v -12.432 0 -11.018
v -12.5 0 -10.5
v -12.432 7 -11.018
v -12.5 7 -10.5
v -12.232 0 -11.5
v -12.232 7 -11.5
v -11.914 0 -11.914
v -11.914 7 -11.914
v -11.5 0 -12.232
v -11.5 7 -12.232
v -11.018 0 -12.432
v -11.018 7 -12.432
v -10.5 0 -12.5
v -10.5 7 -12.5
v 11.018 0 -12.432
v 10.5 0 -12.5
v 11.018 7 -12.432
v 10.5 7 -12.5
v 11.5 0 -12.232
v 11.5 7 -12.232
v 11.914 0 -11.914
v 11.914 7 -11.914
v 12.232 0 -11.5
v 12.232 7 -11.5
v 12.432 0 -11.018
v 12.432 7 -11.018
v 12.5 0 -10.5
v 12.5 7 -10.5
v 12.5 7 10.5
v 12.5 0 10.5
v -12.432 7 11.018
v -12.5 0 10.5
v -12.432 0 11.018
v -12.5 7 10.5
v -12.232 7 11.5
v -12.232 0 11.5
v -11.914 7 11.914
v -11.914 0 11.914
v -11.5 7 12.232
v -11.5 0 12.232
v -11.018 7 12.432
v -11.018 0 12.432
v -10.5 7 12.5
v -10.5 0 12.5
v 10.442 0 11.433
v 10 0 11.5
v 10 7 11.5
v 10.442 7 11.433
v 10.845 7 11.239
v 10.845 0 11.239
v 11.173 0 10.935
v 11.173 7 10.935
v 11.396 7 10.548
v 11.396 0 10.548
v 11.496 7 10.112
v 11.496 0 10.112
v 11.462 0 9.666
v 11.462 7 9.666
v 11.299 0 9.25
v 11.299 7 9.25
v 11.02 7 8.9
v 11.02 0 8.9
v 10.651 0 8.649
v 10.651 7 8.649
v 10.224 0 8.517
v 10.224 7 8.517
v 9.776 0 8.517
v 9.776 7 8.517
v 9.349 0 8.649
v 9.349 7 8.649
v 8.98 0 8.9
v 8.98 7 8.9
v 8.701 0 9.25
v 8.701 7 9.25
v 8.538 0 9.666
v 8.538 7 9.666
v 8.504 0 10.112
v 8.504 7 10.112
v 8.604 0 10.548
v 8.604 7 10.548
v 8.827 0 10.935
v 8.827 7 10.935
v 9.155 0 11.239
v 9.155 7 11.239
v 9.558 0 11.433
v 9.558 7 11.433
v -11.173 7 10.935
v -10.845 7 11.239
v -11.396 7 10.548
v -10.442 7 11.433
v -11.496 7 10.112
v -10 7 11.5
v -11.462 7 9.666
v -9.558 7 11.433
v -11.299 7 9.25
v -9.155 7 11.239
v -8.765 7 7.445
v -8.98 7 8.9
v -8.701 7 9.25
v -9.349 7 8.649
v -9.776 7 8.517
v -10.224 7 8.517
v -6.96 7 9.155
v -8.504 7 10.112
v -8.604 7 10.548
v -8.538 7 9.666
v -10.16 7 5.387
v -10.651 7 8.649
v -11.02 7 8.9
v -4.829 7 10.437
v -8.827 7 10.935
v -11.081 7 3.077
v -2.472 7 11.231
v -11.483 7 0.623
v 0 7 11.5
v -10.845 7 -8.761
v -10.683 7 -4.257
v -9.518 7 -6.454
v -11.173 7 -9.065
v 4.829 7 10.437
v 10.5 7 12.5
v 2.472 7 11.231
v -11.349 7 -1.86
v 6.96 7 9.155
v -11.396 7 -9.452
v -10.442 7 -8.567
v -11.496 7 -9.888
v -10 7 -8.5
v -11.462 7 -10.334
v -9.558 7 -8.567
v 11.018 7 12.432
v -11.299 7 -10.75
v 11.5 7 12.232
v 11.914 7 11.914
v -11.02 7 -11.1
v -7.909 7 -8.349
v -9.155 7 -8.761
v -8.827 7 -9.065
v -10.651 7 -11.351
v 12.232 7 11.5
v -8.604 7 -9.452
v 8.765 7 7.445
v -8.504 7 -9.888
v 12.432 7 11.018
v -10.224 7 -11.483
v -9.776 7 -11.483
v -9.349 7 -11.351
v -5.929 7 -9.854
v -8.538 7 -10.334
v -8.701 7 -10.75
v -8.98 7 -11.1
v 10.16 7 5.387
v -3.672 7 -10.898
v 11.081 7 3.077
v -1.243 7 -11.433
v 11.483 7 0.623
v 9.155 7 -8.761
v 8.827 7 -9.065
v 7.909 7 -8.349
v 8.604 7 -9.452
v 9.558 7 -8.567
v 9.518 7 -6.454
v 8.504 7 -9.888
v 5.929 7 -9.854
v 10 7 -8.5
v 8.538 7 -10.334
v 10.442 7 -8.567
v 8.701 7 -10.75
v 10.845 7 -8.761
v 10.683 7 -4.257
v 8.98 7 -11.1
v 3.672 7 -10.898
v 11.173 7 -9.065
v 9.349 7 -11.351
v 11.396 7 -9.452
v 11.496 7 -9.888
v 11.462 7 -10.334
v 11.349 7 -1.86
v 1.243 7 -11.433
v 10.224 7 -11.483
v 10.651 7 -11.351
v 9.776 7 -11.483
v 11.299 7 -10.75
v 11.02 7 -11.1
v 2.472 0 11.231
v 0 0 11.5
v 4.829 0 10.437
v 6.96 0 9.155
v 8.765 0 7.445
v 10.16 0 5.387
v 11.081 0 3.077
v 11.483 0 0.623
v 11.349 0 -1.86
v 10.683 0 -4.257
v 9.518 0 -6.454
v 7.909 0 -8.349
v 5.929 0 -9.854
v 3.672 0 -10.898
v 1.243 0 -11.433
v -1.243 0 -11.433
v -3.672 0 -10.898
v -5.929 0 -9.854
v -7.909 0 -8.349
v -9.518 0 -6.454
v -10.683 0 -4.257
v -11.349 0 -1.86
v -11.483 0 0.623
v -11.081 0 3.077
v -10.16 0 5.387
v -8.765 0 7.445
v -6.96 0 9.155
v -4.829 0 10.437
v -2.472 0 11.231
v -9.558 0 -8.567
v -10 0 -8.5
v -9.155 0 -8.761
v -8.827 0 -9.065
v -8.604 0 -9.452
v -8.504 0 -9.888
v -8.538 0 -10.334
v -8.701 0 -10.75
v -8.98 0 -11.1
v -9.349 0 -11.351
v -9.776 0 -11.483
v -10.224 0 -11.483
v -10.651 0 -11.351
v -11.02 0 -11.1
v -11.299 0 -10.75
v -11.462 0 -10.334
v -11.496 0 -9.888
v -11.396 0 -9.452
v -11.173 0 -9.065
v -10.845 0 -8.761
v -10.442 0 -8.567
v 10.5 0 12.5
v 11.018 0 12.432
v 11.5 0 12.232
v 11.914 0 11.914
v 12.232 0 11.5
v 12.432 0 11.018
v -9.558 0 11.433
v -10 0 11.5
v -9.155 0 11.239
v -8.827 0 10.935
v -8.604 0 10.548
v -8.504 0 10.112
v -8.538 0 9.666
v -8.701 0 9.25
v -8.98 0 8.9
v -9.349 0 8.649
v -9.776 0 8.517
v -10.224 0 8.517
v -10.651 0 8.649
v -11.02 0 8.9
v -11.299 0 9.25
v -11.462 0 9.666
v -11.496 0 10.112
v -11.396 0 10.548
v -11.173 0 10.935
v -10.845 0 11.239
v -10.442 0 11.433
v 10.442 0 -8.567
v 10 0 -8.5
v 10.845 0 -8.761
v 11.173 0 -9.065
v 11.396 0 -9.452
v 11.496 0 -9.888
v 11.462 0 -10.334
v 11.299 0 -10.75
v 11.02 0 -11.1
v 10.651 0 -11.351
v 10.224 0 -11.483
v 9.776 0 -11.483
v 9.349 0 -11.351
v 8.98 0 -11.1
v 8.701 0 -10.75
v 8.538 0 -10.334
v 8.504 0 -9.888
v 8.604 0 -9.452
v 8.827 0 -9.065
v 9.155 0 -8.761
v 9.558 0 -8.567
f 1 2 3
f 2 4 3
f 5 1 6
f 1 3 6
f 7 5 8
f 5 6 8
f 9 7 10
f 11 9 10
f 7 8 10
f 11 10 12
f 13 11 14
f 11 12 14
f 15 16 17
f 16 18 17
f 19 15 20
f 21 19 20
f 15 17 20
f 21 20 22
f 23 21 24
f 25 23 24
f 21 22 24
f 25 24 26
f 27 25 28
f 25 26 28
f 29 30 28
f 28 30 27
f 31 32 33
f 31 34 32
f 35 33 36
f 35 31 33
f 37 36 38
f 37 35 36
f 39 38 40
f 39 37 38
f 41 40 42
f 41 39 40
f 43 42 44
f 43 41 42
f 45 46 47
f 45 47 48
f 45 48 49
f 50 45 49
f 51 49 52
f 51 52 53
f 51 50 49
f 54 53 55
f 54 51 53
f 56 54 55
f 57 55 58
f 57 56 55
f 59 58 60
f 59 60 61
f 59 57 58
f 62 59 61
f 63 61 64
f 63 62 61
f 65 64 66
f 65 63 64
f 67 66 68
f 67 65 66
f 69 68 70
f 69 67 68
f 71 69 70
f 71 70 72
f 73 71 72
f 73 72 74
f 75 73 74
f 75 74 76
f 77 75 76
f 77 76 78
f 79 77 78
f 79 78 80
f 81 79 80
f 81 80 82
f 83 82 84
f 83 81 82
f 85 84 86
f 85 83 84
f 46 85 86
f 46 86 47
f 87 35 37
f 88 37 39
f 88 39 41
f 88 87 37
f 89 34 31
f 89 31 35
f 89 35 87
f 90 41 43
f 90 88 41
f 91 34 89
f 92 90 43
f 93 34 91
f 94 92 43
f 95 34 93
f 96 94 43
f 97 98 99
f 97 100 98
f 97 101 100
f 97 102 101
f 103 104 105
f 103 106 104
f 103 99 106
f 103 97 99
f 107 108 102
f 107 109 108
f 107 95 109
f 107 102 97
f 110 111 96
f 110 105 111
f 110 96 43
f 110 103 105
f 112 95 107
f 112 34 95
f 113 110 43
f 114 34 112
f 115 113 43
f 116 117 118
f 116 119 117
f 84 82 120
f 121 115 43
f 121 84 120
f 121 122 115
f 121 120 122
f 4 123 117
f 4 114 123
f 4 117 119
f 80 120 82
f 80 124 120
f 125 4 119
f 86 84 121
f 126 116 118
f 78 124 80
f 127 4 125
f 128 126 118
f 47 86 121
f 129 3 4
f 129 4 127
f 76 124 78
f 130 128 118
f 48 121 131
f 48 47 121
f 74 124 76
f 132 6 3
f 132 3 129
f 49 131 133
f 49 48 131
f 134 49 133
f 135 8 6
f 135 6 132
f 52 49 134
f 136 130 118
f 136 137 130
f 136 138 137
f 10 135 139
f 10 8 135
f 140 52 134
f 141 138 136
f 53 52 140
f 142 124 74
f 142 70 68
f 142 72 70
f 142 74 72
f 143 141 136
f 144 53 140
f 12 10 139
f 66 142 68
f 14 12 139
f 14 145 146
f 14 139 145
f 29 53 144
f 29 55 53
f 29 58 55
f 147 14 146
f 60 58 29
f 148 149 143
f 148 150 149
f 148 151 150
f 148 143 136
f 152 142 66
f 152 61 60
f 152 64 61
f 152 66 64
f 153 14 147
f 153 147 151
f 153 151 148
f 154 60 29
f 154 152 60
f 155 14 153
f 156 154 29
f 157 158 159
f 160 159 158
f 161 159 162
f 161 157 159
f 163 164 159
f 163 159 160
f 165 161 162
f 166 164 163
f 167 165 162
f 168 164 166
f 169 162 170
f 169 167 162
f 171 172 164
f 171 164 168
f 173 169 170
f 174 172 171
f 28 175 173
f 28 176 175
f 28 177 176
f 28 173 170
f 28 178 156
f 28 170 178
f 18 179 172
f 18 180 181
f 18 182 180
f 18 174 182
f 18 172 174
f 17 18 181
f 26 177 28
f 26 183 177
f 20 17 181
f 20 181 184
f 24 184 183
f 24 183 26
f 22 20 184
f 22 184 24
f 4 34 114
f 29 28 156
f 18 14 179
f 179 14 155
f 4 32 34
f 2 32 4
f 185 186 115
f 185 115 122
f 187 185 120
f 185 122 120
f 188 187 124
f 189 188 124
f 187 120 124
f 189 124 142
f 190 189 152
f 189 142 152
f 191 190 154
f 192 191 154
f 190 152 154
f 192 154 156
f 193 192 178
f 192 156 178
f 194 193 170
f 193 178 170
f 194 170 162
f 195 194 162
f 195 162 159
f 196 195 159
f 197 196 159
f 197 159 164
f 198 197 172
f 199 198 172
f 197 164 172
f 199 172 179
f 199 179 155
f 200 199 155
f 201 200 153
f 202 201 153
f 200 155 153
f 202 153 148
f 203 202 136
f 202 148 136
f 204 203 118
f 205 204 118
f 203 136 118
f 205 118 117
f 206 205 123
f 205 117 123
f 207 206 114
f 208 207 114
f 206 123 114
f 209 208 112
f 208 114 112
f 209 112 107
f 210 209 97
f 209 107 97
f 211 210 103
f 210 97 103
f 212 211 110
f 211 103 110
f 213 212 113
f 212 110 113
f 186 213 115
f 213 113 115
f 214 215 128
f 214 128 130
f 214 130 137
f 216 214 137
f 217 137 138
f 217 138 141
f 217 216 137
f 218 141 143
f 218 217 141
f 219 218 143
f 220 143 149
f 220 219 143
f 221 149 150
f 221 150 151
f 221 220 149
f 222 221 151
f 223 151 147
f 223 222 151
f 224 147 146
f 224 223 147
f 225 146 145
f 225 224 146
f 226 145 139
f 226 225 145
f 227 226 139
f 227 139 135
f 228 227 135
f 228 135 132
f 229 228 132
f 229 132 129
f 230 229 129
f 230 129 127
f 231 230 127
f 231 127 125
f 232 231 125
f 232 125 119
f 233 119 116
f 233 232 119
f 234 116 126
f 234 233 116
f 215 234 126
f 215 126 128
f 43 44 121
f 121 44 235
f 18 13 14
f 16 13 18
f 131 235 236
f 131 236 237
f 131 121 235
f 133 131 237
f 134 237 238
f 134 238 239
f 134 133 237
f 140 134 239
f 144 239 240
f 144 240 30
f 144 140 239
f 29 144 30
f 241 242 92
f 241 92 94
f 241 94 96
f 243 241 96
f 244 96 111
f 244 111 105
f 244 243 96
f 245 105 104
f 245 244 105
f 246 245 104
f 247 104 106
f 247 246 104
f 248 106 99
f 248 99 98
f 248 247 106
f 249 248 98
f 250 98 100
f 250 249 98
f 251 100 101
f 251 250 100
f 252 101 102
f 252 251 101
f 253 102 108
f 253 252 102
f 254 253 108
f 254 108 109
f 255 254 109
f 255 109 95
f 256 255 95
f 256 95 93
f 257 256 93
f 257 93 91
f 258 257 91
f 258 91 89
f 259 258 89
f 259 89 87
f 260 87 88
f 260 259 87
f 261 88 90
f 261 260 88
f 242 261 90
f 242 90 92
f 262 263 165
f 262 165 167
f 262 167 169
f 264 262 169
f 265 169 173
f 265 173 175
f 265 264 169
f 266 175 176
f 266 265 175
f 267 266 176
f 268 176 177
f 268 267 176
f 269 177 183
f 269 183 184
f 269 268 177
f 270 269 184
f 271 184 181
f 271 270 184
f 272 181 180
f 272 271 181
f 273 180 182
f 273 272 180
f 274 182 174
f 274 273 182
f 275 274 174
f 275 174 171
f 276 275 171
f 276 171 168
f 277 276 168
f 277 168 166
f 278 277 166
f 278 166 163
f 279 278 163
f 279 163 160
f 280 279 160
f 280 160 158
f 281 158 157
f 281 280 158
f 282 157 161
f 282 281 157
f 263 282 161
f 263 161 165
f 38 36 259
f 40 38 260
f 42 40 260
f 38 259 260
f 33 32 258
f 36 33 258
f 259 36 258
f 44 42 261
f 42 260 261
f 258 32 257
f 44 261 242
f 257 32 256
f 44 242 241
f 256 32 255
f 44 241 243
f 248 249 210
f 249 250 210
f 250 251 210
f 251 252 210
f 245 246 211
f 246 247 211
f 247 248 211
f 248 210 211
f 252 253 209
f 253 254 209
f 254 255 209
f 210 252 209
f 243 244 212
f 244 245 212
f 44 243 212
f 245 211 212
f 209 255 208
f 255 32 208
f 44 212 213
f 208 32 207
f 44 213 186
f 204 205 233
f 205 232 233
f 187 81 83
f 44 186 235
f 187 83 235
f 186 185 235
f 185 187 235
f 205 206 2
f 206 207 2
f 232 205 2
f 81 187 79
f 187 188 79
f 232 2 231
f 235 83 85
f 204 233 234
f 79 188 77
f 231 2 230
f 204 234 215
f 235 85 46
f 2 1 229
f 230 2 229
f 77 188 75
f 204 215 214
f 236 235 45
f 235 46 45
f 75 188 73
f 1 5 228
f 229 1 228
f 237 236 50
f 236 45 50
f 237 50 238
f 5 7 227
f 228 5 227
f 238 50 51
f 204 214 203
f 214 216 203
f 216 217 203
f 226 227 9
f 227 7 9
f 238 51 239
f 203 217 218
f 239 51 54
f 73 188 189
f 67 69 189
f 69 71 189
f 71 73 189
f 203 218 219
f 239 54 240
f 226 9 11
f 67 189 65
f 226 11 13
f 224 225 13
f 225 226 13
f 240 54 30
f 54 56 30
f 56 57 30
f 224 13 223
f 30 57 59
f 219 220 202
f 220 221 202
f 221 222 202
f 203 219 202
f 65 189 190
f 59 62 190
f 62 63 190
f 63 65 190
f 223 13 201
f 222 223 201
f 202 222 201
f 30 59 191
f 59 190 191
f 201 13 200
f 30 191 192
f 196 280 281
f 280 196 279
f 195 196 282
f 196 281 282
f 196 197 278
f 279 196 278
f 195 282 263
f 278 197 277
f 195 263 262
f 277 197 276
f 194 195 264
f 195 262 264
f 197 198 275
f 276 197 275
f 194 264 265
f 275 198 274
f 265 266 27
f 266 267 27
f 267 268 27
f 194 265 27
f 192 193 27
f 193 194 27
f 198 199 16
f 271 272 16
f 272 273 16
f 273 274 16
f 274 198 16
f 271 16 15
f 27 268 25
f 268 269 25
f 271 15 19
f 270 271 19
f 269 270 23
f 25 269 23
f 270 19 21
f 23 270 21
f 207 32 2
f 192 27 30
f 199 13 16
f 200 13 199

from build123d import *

# Parameters (mm, degrees)
SKETCH_1_W          = 25
SKETCH_1_H          = 25
SKETCH_1_R          = 1.5
EXTRUDE_1_DEPTH     = 7
FILLET_1_R          = 2
SKETCH_2_R          = 11.5
CUT_EXTRUDE_1_DEPTH = 7


with BuildPart() as part:
    # 草图1 → 凸台-拉伸1 (new body)
    with BuildSketch(Plane(origin=(0, 0, 0), x_dir=(1, 0, 0), z_dir=(0, 1, 0))):
        Rectangle(SKETCH_1_W, SKETCH_1_H)
        with Locations(Location((-10, -10, 0), (0, 0, 270))):
            Circle(SKETCH_1_R, mode=Mode.SUBTRACT)
        with Locations(Location((10, -10, 0), (0, 0, 270))):
            Circle(SKETCH_1_R, mode=Mode.SUBTRACT)
        with Locations(Location((10, 10, 0), (0, 0, 270))):
            Circle(SKETCH_1_R, mode=Mode.SUBTRACT)
        with Locations(Location((-10, 10, 0), (0, 0, 270))):
            Circle(SKETCH_1_R, mode=Mode.SUBTRACT)
    extrude(amount=EXTRUDE_1_DEPTH)

    # 圆角1
    fillet_1_edges = [part.edges().sort_by_distance(p)[0] for p in [
        (12.5, 3.5, 12.5),
        (-12.5, 3.5, 12.5),
        (-12.5, 3.5, -12.5),
        (12.5, 3.5, -12.5),
    ]]
    fillet(fillet_1_edges, radius=FILLET_1_R)

    # 草图2 → 切除-拉伸1 (cut)
    with BuildSketch(Plane(origin=(0, 7, 0), x_dir=(1, 0, 0), z_dir=(0, 1, 0))):
        with Locations(Location((0, 0, 0), (0, 0, 270))):
            Circle(SKETCH_2_R)
    extrude(amount=-CUT_EXTRUDE_1_DEPTH, mode=Mode.SUBTRACT)


solid = part.part
